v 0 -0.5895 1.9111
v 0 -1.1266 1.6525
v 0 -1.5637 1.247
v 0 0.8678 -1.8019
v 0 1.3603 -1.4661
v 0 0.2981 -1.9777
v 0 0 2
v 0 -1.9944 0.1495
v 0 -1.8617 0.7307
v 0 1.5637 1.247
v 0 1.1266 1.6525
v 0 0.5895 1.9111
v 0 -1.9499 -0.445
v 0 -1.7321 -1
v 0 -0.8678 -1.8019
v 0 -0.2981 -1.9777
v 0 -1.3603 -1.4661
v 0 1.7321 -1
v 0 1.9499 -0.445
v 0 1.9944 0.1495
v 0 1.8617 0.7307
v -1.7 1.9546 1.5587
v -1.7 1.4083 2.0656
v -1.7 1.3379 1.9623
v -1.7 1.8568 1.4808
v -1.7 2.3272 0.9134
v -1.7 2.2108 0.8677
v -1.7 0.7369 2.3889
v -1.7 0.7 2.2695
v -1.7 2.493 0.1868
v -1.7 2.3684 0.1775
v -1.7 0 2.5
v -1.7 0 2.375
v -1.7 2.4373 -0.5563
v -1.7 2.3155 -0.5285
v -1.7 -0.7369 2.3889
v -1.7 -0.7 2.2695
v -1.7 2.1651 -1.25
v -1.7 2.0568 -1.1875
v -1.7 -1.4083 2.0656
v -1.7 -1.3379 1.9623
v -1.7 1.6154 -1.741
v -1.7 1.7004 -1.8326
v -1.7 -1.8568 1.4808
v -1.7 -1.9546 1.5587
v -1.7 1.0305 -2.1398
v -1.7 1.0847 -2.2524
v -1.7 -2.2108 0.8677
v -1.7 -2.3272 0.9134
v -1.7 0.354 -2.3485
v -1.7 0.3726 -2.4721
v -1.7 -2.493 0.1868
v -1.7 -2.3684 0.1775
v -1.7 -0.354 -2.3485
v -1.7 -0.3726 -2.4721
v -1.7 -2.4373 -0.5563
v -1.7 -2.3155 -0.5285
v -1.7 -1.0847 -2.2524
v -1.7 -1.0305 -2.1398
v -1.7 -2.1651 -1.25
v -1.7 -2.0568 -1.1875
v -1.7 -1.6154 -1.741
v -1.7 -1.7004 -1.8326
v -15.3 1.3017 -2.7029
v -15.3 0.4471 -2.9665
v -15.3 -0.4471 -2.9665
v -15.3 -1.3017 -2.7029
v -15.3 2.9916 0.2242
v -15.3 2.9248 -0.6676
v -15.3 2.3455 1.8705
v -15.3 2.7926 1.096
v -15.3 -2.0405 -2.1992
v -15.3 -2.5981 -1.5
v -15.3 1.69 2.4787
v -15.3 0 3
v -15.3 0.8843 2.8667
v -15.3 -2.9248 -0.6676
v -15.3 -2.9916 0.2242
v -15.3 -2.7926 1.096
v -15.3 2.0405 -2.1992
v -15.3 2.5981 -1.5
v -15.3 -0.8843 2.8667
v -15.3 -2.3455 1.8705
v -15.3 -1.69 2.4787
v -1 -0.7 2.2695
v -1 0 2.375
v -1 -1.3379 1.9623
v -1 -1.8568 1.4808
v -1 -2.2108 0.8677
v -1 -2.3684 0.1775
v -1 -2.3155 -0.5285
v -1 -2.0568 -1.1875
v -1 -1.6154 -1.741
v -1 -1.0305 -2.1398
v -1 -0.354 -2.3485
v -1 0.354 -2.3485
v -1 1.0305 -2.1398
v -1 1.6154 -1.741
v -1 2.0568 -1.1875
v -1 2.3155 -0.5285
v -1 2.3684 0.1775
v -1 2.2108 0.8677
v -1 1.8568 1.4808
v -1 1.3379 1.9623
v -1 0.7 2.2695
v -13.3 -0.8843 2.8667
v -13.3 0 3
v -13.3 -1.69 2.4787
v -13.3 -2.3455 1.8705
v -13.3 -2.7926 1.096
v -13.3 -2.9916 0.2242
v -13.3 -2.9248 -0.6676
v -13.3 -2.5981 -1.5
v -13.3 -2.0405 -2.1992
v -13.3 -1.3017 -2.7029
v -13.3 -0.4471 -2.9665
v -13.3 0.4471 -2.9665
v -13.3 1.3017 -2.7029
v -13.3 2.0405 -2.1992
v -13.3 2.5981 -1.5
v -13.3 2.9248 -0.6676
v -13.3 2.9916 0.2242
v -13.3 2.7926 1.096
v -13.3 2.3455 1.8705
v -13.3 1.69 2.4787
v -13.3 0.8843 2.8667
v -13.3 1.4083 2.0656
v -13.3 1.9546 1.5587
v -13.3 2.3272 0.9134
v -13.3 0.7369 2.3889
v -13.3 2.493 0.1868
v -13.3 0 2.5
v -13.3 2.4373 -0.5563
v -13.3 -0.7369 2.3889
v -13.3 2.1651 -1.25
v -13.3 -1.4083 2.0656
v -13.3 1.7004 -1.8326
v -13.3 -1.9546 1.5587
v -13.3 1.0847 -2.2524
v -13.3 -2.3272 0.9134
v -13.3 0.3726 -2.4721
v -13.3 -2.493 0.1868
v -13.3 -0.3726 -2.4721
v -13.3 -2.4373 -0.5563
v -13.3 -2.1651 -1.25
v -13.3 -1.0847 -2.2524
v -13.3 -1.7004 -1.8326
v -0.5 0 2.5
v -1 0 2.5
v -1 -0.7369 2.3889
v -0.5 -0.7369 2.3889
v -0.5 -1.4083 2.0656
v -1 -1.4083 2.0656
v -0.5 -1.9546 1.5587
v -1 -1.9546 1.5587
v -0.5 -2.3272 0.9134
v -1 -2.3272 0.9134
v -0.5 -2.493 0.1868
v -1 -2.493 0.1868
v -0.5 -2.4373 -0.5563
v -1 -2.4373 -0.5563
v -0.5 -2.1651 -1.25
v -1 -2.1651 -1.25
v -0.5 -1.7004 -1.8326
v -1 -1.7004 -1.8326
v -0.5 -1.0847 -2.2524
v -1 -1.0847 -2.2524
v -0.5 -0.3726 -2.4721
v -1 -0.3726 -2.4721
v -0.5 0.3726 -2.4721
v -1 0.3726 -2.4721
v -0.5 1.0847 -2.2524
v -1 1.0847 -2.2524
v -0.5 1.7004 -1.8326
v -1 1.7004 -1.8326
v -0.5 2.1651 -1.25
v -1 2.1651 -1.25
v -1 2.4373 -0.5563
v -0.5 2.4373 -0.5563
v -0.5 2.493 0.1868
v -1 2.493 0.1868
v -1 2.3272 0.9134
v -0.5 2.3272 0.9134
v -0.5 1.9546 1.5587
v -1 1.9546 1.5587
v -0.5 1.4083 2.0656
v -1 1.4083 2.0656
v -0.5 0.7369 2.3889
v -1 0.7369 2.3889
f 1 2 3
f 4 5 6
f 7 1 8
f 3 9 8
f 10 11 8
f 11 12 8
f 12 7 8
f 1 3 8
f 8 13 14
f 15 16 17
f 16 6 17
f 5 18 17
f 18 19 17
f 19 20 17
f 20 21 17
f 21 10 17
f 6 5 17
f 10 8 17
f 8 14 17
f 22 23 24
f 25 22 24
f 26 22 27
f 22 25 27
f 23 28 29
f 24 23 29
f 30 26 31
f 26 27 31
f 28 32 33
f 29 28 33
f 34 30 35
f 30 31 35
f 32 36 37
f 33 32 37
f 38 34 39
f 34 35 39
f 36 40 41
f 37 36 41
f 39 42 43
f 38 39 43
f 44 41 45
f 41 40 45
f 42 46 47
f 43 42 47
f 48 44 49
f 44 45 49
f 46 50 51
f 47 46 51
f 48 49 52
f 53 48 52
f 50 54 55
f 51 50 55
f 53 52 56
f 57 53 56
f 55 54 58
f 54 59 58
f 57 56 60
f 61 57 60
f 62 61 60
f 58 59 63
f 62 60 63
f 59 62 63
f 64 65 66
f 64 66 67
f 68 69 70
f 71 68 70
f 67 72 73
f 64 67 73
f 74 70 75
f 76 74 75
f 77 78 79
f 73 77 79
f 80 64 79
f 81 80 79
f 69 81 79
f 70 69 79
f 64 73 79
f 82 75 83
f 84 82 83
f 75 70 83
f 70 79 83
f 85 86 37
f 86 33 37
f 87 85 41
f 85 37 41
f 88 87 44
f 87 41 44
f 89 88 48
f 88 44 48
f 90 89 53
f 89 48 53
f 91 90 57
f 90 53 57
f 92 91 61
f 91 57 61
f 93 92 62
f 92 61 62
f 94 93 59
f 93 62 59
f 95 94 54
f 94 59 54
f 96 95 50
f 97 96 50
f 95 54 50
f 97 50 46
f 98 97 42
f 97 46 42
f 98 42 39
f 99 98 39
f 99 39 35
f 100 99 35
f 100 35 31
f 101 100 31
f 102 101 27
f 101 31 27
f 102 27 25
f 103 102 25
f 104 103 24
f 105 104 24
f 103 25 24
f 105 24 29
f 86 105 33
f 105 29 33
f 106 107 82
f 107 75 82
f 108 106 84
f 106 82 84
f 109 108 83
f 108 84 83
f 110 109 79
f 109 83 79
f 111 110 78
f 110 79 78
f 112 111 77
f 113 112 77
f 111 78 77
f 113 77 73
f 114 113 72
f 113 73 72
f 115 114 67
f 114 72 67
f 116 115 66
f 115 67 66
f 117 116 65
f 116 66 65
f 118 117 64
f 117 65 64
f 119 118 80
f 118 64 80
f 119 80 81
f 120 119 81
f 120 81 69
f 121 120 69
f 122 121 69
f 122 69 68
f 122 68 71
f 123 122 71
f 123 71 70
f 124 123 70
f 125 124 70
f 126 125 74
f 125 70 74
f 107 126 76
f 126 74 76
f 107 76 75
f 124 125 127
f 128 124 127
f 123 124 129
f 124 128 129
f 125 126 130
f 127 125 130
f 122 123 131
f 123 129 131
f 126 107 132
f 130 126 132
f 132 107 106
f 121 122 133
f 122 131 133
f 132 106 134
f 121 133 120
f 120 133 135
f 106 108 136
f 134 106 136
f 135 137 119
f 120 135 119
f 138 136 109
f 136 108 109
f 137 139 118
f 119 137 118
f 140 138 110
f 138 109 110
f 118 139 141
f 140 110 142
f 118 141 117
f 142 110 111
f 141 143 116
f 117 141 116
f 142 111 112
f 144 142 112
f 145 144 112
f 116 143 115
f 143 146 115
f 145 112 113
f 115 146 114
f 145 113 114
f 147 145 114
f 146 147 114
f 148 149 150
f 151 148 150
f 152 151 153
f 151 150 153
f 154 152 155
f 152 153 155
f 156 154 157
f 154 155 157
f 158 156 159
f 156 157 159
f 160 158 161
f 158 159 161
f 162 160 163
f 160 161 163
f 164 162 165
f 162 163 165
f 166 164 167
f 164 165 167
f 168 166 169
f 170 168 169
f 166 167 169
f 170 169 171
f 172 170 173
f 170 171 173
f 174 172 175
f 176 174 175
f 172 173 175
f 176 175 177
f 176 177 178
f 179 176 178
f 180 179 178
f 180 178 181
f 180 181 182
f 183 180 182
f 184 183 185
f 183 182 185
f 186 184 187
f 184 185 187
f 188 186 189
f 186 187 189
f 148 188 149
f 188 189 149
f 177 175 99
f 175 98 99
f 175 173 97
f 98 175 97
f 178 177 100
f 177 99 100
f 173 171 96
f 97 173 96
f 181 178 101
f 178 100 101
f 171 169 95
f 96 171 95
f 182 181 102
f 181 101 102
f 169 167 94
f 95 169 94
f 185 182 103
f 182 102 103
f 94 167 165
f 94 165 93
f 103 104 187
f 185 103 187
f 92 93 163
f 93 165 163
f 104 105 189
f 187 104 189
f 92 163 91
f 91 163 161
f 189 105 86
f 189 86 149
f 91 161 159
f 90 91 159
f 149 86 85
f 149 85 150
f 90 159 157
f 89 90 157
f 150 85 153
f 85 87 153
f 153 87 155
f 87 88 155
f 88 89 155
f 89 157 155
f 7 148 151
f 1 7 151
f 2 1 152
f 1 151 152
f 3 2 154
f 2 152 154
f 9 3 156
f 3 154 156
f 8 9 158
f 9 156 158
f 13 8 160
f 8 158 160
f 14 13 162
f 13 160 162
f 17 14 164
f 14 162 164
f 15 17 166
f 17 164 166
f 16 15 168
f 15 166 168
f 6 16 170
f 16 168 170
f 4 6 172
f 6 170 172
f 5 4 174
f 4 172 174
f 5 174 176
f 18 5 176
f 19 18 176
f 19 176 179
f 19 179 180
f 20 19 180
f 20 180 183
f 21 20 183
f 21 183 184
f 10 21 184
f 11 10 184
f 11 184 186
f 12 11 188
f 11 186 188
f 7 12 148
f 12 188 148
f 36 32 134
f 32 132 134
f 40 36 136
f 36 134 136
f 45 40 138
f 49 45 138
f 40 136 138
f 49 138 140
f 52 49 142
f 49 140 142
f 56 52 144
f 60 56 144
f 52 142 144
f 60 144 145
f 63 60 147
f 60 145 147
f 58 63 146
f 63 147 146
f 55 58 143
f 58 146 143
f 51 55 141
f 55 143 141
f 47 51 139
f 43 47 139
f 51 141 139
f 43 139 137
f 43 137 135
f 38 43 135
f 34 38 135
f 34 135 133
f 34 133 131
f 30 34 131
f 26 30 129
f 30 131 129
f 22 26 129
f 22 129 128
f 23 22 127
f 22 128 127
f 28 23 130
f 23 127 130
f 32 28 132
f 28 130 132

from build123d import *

# Parameters (mm, degrees)
CHAMFER_1_SIZE = 0.5


with BuildPart() as part:
    # 草图1 → 旋转1 (revolve)
    with BuildSketch(Plane.XY, mode=Mode.PRIVATE) as revolve_1_sk:
        Polygon((-15.3, 0), (0, 0), (0, 2.5), (-1, 2.5), (-1, 2.375), (-1.7, 2.375), (-1.7, 2.5), (-13.3, 2.5), (-13.3, 3), (-15.3, 3), align=None)
    revolve(revolve_1_sk.sketch.rotate(Axis((-15.3, 0, 0), (1, 0, 0)), 90), axis=Axis((-15.3, 0, 0), (1, 0, 0)))

    # 倒角1
    chamfer_1_edges = [part.edges().sort_by_distance(p)[0] for p in [
        (0, 0, -2.5),
    ]]
    chamfer(chamfer_1_edges, length=CHAMFER_1_SIZE)


solid = part.part
